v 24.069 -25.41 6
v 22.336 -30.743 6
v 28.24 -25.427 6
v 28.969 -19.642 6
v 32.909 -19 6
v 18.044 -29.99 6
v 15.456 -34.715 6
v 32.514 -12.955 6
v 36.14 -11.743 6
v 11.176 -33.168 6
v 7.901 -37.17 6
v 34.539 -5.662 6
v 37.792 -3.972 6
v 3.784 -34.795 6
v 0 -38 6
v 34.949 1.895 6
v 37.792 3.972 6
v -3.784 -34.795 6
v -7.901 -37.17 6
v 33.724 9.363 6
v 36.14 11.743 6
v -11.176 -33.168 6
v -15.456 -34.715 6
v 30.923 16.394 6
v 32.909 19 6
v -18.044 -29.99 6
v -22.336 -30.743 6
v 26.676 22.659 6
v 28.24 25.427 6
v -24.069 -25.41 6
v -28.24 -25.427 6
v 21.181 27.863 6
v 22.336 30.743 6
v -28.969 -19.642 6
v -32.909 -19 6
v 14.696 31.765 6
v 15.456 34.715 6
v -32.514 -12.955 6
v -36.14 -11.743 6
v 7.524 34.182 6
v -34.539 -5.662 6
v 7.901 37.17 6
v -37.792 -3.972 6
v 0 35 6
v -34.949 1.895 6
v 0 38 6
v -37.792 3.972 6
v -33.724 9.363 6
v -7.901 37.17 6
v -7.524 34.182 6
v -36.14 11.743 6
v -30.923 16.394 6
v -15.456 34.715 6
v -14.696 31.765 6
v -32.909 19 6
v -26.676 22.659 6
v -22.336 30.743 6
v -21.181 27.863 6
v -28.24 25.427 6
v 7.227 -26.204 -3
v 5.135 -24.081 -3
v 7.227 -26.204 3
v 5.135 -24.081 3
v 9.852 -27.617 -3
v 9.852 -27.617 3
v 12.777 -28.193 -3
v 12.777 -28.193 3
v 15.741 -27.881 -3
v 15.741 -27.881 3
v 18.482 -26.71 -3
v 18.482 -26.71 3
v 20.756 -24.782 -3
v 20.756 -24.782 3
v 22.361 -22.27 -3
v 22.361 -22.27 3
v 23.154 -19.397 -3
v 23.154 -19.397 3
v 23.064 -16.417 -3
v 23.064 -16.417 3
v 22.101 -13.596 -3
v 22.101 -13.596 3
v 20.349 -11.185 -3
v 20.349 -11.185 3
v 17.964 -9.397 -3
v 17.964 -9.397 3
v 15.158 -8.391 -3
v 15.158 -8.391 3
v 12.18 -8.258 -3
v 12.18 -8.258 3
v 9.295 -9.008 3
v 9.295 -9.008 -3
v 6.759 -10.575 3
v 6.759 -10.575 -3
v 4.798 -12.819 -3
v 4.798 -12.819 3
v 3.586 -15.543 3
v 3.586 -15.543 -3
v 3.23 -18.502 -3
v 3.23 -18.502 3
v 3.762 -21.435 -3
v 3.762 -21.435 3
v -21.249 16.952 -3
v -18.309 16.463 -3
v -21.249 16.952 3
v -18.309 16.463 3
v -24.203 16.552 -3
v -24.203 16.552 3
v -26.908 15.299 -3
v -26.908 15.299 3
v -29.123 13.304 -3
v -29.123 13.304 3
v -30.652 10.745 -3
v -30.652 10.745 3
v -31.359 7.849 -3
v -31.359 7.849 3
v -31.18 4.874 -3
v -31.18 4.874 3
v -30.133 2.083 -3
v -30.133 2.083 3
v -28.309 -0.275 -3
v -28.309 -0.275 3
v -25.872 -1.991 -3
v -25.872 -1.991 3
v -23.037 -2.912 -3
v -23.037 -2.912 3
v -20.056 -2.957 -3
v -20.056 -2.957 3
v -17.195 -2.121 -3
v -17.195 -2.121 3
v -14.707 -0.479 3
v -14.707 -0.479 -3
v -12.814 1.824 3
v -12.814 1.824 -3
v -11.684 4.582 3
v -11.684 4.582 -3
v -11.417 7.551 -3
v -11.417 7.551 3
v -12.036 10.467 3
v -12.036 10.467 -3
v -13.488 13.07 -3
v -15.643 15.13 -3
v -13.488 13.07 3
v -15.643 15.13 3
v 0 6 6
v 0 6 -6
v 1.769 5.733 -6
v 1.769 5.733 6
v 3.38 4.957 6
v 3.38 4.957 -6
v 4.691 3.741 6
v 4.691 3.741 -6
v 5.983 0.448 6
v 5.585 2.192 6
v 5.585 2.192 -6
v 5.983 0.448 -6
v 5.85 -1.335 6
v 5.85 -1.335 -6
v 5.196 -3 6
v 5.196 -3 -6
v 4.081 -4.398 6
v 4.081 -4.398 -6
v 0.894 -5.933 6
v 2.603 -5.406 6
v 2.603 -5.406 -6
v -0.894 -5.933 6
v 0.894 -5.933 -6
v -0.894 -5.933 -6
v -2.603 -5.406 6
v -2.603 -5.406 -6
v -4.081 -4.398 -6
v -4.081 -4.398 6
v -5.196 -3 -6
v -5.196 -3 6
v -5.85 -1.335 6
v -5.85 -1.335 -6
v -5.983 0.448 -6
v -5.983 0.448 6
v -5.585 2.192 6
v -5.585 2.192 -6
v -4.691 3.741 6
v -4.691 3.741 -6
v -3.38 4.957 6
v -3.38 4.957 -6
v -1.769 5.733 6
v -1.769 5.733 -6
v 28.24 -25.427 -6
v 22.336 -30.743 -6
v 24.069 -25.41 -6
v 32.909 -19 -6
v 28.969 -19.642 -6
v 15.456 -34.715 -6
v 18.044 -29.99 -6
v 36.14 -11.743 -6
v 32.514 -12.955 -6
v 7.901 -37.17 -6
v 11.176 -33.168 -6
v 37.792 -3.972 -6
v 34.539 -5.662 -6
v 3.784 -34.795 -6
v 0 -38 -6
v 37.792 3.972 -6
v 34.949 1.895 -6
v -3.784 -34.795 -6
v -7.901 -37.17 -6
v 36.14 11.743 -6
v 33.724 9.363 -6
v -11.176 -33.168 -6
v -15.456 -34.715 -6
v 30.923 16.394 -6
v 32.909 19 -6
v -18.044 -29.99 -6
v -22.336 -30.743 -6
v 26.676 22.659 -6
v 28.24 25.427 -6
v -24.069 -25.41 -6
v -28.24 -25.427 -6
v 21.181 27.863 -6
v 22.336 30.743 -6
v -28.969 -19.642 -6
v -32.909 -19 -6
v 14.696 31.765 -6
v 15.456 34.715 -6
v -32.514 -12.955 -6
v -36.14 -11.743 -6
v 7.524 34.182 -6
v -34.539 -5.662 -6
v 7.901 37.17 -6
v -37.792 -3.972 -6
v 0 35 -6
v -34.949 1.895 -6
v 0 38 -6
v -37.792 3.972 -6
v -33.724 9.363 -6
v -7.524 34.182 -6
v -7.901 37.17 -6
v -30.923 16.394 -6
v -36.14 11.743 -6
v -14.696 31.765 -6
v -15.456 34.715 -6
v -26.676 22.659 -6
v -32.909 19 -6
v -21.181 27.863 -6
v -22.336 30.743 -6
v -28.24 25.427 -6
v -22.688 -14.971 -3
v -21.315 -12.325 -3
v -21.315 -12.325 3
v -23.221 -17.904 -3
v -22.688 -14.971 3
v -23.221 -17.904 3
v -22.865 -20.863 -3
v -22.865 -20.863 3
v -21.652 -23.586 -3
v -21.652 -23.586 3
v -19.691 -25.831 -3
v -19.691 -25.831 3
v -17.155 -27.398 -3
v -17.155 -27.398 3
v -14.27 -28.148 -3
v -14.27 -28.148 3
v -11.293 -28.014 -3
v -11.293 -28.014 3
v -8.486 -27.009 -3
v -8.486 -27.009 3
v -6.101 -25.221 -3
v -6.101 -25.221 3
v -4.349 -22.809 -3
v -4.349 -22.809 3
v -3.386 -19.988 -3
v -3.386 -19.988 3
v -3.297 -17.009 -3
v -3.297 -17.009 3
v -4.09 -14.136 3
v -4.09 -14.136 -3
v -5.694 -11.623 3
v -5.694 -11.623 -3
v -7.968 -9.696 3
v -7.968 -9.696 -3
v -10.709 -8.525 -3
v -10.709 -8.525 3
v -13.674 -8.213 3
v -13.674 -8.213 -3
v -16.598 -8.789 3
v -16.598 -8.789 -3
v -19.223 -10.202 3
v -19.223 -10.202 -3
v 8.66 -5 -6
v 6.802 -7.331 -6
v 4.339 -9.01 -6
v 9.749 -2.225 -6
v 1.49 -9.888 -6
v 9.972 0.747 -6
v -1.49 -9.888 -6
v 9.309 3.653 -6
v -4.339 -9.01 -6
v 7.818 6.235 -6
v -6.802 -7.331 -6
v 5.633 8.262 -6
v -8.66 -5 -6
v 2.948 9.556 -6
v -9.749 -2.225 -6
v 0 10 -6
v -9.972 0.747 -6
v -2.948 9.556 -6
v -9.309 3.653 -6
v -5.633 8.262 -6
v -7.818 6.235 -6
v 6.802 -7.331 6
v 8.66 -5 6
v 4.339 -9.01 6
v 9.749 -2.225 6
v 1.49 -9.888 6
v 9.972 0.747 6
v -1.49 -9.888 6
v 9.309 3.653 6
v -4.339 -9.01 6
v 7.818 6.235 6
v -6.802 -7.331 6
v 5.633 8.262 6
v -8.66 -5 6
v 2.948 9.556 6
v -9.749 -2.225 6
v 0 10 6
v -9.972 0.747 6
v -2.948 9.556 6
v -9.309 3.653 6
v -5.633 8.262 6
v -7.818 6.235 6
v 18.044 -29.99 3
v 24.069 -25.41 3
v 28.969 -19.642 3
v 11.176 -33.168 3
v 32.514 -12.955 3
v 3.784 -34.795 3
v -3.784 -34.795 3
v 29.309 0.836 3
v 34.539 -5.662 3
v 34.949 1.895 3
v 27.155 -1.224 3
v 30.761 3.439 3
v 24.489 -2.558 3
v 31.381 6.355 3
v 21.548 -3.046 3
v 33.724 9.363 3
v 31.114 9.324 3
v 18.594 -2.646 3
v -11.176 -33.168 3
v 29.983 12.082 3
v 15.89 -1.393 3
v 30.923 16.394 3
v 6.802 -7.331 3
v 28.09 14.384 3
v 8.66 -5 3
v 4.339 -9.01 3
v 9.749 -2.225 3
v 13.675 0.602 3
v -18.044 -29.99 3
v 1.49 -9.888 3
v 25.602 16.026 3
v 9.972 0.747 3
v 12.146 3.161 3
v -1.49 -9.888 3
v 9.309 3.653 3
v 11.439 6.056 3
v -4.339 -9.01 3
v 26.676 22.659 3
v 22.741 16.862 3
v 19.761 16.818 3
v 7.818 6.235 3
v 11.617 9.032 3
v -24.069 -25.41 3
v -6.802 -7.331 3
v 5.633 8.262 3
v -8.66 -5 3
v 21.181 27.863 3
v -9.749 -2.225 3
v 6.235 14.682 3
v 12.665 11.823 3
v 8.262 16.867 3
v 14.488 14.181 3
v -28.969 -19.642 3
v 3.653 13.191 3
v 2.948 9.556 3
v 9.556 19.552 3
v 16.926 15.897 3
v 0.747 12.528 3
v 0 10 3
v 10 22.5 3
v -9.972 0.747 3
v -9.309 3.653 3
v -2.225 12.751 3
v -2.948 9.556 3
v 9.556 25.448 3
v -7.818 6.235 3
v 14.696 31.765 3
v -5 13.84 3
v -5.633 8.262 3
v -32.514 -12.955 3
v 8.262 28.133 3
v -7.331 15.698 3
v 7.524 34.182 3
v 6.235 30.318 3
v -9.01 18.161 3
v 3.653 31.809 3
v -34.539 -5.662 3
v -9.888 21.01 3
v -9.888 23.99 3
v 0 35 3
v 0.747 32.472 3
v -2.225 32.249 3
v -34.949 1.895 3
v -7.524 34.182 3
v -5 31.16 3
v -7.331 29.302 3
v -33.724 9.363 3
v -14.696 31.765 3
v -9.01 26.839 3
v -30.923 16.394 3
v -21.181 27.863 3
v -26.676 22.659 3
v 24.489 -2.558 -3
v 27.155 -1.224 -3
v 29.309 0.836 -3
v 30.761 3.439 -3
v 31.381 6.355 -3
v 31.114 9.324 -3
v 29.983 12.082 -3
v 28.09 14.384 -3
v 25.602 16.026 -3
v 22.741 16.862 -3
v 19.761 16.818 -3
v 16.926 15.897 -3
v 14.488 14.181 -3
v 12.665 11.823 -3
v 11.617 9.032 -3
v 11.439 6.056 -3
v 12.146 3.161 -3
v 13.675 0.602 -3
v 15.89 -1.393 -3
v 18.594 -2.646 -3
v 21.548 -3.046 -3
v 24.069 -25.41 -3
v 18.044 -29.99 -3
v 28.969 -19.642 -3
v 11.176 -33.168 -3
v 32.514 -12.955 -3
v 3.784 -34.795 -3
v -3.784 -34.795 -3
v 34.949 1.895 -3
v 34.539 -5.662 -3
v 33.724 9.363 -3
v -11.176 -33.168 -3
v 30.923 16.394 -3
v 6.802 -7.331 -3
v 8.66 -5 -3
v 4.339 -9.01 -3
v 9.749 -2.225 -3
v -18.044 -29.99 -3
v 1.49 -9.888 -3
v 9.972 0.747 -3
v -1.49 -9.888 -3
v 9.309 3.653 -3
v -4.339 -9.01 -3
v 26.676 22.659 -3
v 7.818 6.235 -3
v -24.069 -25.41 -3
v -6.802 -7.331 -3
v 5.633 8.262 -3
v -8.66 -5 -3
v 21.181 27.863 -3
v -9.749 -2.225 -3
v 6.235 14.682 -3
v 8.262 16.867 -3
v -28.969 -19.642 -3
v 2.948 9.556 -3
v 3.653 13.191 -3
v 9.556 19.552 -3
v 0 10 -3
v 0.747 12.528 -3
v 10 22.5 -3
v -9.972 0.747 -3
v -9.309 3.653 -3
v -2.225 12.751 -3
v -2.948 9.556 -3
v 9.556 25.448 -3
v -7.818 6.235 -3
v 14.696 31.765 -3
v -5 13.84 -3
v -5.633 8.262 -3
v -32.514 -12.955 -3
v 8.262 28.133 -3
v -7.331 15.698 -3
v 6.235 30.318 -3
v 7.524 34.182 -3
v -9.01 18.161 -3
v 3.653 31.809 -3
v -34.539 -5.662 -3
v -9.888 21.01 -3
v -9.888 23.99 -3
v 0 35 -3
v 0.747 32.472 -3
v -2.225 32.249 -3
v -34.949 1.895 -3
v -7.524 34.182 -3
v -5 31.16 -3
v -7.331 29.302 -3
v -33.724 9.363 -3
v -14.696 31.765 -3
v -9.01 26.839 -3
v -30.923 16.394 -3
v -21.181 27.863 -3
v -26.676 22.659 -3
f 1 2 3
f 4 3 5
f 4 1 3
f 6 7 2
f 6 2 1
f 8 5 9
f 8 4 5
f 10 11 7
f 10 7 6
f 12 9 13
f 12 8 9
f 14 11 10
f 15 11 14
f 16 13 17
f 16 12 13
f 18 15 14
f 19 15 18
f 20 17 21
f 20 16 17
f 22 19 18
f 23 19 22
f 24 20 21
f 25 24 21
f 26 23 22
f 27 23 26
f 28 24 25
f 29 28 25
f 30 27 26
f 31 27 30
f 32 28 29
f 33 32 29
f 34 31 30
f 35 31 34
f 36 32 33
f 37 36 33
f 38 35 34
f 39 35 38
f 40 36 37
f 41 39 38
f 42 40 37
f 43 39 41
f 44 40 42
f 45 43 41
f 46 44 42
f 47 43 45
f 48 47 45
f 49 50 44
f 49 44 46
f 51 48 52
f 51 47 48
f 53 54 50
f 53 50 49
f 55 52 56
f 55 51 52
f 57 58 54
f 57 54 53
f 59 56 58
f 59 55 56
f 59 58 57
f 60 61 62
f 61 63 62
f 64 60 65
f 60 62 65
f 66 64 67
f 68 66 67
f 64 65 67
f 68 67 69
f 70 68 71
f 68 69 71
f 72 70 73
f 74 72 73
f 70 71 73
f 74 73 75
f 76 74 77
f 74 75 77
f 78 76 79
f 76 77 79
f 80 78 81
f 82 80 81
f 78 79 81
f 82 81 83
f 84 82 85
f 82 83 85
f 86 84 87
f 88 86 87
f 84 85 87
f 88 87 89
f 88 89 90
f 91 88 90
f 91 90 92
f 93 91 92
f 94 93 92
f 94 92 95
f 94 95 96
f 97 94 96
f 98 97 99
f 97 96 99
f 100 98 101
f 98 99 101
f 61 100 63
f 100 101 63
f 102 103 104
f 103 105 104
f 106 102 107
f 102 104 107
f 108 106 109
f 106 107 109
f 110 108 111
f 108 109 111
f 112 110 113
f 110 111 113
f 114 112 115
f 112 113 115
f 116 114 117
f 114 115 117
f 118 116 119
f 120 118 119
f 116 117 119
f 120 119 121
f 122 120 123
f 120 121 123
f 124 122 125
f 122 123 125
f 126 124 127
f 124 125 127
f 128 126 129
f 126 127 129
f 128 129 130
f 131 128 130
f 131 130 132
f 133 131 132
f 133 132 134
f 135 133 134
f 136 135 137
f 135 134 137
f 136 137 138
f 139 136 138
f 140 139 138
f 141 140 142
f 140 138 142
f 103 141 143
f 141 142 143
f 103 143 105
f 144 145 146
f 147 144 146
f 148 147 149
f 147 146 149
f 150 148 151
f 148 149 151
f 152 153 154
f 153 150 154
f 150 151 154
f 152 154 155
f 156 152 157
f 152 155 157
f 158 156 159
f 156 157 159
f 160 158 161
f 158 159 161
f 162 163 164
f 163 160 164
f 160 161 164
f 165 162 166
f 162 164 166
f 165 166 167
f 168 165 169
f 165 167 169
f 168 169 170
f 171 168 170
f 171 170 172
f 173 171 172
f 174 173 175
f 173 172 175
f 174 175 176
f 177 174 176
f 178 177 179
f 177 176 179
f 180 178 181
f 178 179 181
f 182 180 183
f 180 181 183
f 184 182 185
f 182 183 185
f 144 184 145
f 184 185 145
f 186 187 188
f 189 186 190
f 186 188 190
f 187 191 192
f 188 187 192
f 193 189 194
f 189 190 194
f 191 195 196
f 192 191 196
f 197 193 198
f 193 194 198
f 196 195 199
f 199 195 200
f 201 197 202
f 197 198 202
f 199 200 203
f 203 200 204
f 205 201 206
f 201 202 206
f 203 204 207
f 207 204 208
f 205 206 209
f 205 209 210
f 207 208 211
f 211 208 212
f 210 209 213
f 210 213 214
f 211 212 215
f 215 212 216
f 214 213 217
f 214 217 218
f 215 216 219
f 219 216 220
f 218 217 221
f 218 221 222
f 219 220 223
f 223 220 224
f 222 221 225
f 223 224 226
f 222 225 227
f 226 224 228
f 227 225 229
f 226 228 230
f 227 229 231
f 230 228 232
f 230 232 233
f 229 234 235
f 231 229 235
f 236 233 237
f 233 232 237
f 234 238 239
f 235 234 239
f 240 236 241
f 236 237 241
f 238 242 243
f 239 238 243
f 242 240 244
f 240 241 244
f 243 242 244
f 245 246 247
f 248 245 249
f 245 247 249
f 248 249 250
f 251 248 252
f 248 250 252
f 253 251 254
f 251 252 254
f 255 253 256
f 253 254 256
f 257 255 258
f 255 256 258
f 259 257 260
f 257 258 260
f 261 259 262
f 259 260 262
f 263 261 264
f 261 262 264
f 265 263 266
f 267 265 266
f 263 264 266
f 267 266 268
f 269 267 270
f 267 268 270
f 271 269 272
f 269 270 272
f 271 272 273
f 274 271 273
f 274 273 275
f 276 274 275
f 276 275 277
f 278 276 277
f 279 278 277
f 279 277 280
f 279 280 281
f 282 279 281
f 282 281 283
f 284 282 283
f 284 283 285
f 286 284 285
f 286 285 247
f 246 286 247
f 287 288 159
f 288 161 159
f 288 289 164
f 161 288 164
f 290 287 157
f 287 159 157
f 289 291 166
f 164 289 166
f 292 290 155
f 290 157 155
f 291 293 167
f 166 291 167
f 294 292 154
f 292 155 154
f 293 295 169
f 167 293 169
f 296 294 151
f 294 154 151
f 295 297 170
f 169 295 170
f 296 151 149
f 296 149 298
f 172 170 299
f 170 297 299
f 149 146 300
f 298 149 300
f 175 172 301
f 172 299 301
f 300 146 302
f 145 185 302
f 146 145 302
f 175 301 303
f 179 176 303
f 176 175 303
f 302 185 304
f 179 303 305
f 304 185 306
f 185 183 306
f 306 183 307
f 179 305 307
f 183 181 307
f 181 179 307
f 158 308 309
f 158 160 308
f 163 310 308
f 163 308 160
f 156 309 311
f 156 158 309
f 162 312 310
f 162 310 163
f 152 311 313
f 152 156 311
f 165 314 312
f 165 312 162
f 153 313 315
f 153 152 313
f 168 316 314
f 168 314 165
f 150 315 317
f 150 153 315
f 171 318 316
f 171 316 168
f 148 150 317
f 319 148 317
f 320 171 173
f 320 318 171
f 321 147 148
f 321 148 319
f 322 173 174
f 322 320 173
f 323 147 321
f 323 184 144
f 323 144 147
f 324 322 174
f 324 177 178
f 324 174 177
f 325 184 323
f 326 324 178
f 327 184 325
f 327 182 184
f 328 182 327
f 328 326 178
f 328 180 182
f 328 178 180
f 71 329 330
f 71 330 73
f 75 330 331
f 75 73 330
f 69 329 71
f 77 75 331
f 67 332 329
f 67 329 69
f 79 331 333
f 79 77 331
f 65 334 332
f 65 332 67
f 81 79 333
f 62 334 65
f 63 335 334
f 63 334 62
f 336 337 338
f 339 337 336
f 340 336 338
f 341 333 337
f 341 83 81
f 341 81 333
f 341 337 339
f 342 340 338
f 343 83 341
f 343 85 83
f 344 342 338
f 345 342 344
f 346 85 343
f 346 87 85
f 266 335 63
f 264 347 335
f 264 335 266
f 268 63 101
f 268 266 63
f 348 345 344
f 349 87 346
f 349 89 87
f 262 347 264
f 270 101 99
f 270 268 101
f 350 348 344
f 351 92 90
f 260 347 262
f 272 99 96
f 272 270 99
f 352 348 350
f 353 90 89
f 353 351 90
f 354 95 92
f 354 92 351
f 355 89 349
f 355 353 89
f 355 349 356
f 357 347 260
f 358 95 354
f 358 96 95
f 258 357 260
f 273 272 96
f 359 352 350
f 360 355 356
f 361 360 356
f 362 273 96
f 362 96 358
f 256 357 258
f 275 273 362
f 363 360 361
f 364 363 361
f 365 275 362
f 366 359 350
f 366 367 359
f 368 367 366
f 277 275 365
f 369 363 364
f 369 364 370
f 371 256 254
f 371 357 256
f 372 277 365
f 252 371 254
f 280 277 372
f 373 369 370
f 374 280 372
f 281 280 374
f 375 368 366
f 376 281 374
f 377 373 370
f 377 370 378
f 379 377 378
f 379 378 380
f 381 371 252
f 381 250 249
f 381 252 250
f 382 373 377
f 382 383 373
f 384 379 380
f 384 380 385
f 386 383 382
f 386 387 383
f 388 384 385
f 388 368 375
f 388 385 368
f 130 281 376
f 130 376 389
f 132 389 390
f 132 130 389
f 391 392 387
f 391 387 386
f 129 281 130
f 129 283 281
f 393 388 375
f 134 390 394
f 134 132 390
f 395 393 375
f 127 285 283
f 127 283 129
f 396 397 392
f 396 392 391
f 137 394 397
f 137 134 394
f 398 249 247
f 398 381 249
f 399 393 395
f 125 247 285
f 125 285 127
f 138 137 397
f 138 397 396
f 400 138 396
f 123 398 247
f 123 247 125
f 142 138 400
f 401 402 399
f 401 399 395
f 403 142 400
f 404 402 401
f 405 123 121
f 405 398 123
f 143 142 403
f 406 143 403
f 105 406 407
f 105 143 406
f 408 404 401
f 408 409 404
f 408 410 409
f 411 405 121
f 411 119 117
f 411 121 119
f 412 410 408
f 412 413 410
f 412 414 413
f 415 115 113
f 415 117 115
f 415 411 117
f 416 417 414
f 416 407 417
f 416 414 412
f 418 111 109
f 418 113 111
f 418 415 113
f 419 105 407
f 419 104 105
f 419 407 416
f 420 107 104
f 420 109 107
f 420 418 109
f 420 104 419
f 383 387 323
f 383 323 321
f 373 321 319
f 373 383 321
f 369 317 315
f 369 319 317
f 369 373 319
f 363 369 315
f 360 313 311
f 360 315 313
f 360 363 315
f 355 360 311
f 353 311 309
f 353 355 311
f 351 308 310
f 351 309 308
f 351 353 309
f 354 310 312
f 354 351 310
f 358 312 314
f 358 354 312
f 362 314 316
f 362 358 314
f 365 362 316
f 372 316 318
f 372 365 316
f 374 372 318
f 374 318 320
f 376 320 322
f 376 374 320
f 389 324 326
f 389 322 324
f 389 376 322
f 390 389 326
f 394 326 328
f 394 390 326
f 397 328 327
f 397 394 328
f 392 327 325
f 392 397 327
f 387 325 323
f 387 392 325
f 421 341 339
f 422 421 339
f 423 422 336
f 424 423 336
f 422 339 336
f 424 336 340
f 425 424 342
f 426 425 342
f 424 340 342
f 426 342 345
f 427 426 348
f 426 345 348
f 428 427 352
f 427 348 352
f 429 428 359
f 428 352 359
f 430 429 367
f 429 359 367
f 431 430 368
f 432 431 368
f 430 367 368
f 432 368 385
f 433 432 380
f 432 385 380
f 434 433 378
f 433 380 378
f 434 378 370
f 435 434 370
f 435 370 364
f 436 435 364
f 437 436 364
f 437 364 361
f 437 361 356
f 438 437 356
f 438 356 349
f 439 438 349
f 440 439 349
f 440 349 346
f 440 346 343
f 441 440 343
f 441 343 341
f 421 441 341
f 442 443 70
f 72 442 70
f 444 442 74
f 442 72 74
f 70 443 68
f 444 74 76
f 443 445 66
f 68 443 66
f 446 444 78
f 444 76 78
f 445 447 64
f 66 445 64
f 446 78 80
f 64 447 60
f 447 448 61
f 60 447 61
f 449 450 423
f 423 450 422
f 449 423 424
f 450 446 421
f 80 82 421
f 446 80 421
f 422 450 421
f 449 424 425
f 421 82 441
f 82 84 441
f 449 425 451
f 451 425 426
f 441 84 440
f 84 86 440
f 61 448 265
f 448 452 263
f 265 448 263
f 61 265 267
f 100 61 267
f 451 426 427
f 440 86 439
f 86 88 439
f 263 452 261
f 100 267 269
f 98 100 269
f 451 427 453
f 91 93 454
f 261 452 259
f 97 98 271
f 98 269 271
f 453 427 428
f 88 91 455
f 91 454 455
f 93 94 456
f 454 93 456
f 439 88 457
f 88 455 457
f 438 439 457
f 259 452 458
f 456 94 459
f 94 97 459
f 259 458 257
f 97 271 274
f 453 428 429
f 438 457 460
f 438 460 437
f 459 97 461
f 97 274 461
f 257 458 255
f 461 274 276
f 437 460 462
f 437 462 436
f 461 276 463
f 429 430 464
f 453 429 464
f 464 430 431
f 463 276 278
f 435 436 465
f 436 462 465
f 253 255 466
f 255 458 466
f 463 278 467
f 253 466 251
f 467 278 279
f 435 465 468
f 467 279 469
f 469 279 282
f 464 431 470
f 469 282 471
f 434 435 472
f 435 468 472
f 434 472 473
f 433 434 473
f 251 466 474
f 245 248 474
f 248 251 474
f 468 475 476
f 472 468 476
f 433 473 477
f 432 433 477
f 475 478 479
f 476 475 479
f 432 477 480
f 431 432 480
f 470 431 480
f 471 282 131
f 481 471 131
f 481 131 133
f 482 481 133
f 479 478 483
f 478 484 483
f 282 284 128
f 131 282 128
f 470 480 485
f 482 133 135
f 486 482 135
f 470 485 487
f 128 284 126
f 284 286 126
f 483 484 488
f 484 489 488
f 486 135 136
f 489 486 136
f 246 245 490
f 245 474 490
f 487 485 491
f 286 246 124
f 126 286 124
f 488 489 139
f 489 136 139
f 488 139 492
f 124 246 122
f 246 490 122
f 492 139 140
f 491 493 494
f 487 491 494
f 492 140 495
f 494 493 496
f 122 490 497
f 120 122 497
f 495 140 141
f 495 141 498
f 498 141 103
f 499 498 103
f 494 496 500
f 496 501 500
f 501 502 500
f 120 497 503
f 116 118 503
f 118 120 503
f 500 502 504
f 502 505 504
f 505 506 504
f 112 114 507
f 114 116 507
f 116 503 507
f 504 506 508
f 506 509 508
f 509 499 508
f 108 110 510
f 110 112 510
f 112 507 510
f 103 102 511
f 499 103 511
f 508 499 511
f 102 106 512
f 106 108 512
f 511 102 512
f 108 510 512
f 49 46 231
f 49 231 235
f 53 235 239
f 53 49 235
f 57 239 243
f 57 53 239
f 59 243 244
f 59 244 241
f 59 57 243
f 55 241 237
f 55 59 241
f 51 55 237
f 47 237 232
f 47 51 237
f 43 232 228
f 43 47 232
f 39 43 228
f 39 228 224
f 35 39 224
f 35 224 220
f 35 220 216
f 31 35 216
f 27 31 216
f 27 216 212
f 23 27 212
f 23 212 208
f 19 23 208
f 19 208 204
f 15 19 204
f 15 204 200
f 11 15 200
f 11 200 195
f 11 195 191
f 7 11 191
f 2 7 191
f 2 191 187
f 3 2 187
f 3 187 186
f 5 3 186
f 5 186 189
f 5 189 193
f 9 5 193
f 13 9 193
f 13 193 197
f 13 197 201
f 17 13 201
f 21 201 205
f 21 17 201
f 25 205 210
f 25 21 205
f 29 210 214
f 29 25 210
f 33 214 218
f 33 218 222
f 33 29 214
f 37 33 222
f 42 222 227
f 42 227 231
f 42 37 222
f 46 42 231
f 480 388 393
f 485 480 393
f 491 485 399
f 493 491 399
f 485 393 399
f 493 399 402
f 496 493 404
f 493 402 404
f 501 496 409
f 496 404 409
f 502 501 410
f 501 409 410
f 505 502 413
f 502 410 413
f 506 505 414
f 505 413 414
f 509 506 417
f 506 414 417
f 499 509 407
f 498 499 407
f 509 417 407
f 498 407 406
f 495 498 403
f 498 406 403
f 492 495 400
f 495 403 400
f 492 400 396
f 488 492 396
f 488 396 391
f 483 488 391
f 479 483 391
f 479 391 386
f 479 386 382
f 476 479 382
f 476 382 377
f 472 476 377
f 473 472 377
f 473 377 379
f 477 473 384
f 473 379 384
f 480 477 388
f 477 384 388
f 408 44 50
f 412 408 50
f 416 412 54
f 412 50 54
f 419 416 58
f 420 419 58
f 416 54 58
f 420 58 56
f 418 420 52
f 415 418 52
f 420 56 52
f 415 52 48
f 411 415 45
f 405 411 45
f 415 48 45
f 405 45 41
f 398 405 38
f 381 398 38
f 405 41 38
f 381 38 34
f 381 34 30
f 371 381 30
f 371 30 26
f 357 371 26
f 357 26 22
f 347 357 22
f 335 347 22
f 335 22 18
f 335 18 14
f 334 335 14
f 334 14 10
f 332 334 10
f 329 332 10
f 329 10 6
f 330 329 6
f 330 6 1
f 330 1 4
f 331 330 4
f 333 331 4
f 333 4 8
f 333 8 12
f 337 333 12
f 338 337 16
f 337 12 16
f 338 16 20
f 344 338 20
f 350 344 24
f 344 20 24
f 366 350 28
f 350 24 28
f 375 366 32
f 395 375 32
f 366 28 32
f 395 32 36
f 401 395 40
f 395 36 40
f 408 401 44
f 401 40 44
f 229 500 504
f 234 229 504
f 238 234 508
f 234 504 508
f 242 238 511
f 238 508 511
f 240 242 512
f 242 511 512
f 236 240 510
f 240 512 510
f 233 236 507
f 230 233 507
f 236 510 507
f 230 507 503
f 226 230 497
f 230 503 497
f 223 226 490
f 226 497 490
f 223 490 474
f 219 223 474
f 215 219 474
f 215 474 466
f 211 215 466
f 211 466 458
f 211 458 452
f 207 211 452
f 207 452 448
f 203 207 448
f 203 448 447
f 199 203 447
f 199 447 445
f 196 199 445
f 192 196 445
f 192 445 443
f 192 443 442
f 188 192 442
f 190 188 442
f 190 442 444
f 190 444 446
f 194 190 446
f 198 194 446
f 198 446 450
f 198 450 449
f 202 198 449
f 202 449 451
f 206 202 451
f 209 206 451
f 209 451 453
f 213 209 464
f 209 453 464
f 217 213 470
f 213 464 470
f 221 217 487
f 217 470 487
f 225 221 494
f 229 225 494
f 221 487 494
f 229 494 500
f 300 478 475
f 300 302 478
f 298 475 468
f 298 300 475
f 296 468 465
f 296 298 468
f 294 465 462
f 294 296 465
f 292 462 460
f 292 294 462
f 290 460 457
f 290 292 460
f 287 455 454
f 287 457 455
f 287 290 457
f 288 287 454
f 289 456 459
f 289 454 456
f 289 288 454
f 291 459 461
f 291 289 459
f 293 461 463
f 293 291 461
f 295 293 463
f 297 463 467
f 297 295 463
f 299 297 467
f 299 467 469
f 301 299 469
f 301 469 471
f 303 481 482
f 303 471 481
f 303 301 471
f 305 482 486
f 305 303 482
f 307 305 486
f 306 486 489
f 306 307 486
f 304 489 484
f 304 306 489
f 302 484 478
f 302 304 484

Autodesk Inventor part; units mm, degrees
ref_plane "YZ Plane" through (0, 0, 0) normal (1, 0, 0) x (0, 1, 0)
ref_plane "XZ Plane" through (0, 0, 0) normal (0, 1, 0) x (-1, 0, 0)
ref_plane "XY Plane" through (0, 0, 0) normal (0, 0, 1) x (1, 0, 0)
sketch "草圖1" plane through (0, 0, 0) normal (1, 0, 0) x (0, 1, 0)
  line L0 (0, 0) -> (0, 54.3739) construction
  line L1 (0, 0) -> (54.3739, 0) construction
  line L2 (6, 6) -> (6, -6)
  line L3 (38, -6) -> (38, 6)
  line L4 (35, 3) -> (10, 3)
  line L5 (10, 6) -> (10, -6)
  line L6 (10, -3) -> (35, -3)
  line L7 (35, -6) -> (35, 6)
  line L8 (38, 6) -> (35, 6)
  line L9 (10, 6) -> (6, 6)
  line L10 (6, -6) -> (10, -6)
  line L11 (35, -6) -> (38, -6)
  dimension "d2" = 12
  dimension "d3" = 3
  dimension "d4" = 6
  dimension "d5" = 10
  dimension "d6" = 35
  dimension "d7" = 38
  dimension "d8" = 12
revolve "迴轉1" add sketch "草圖1" angle 360 about axis through (0, 0, 0) along (0, 0, 1)
sketch "草圖2" plane through (0, 0, 3) normal (0, 0, 1) x (1, 0, 0)
  circle A0 centre (0, 22.5) radius 10
  point P0 (0, 0)
  dimension "d10" = 20
  dimension "d11" = 22.5
extrude "擠出1" cut sketch "草圖2" against normal through all
pattern_circular "環形陣列1" count 5 over 360 about axis through (0, 0, -10) along (0, 0, 1) of "擠出1"
properties part number "8. 車輪"
